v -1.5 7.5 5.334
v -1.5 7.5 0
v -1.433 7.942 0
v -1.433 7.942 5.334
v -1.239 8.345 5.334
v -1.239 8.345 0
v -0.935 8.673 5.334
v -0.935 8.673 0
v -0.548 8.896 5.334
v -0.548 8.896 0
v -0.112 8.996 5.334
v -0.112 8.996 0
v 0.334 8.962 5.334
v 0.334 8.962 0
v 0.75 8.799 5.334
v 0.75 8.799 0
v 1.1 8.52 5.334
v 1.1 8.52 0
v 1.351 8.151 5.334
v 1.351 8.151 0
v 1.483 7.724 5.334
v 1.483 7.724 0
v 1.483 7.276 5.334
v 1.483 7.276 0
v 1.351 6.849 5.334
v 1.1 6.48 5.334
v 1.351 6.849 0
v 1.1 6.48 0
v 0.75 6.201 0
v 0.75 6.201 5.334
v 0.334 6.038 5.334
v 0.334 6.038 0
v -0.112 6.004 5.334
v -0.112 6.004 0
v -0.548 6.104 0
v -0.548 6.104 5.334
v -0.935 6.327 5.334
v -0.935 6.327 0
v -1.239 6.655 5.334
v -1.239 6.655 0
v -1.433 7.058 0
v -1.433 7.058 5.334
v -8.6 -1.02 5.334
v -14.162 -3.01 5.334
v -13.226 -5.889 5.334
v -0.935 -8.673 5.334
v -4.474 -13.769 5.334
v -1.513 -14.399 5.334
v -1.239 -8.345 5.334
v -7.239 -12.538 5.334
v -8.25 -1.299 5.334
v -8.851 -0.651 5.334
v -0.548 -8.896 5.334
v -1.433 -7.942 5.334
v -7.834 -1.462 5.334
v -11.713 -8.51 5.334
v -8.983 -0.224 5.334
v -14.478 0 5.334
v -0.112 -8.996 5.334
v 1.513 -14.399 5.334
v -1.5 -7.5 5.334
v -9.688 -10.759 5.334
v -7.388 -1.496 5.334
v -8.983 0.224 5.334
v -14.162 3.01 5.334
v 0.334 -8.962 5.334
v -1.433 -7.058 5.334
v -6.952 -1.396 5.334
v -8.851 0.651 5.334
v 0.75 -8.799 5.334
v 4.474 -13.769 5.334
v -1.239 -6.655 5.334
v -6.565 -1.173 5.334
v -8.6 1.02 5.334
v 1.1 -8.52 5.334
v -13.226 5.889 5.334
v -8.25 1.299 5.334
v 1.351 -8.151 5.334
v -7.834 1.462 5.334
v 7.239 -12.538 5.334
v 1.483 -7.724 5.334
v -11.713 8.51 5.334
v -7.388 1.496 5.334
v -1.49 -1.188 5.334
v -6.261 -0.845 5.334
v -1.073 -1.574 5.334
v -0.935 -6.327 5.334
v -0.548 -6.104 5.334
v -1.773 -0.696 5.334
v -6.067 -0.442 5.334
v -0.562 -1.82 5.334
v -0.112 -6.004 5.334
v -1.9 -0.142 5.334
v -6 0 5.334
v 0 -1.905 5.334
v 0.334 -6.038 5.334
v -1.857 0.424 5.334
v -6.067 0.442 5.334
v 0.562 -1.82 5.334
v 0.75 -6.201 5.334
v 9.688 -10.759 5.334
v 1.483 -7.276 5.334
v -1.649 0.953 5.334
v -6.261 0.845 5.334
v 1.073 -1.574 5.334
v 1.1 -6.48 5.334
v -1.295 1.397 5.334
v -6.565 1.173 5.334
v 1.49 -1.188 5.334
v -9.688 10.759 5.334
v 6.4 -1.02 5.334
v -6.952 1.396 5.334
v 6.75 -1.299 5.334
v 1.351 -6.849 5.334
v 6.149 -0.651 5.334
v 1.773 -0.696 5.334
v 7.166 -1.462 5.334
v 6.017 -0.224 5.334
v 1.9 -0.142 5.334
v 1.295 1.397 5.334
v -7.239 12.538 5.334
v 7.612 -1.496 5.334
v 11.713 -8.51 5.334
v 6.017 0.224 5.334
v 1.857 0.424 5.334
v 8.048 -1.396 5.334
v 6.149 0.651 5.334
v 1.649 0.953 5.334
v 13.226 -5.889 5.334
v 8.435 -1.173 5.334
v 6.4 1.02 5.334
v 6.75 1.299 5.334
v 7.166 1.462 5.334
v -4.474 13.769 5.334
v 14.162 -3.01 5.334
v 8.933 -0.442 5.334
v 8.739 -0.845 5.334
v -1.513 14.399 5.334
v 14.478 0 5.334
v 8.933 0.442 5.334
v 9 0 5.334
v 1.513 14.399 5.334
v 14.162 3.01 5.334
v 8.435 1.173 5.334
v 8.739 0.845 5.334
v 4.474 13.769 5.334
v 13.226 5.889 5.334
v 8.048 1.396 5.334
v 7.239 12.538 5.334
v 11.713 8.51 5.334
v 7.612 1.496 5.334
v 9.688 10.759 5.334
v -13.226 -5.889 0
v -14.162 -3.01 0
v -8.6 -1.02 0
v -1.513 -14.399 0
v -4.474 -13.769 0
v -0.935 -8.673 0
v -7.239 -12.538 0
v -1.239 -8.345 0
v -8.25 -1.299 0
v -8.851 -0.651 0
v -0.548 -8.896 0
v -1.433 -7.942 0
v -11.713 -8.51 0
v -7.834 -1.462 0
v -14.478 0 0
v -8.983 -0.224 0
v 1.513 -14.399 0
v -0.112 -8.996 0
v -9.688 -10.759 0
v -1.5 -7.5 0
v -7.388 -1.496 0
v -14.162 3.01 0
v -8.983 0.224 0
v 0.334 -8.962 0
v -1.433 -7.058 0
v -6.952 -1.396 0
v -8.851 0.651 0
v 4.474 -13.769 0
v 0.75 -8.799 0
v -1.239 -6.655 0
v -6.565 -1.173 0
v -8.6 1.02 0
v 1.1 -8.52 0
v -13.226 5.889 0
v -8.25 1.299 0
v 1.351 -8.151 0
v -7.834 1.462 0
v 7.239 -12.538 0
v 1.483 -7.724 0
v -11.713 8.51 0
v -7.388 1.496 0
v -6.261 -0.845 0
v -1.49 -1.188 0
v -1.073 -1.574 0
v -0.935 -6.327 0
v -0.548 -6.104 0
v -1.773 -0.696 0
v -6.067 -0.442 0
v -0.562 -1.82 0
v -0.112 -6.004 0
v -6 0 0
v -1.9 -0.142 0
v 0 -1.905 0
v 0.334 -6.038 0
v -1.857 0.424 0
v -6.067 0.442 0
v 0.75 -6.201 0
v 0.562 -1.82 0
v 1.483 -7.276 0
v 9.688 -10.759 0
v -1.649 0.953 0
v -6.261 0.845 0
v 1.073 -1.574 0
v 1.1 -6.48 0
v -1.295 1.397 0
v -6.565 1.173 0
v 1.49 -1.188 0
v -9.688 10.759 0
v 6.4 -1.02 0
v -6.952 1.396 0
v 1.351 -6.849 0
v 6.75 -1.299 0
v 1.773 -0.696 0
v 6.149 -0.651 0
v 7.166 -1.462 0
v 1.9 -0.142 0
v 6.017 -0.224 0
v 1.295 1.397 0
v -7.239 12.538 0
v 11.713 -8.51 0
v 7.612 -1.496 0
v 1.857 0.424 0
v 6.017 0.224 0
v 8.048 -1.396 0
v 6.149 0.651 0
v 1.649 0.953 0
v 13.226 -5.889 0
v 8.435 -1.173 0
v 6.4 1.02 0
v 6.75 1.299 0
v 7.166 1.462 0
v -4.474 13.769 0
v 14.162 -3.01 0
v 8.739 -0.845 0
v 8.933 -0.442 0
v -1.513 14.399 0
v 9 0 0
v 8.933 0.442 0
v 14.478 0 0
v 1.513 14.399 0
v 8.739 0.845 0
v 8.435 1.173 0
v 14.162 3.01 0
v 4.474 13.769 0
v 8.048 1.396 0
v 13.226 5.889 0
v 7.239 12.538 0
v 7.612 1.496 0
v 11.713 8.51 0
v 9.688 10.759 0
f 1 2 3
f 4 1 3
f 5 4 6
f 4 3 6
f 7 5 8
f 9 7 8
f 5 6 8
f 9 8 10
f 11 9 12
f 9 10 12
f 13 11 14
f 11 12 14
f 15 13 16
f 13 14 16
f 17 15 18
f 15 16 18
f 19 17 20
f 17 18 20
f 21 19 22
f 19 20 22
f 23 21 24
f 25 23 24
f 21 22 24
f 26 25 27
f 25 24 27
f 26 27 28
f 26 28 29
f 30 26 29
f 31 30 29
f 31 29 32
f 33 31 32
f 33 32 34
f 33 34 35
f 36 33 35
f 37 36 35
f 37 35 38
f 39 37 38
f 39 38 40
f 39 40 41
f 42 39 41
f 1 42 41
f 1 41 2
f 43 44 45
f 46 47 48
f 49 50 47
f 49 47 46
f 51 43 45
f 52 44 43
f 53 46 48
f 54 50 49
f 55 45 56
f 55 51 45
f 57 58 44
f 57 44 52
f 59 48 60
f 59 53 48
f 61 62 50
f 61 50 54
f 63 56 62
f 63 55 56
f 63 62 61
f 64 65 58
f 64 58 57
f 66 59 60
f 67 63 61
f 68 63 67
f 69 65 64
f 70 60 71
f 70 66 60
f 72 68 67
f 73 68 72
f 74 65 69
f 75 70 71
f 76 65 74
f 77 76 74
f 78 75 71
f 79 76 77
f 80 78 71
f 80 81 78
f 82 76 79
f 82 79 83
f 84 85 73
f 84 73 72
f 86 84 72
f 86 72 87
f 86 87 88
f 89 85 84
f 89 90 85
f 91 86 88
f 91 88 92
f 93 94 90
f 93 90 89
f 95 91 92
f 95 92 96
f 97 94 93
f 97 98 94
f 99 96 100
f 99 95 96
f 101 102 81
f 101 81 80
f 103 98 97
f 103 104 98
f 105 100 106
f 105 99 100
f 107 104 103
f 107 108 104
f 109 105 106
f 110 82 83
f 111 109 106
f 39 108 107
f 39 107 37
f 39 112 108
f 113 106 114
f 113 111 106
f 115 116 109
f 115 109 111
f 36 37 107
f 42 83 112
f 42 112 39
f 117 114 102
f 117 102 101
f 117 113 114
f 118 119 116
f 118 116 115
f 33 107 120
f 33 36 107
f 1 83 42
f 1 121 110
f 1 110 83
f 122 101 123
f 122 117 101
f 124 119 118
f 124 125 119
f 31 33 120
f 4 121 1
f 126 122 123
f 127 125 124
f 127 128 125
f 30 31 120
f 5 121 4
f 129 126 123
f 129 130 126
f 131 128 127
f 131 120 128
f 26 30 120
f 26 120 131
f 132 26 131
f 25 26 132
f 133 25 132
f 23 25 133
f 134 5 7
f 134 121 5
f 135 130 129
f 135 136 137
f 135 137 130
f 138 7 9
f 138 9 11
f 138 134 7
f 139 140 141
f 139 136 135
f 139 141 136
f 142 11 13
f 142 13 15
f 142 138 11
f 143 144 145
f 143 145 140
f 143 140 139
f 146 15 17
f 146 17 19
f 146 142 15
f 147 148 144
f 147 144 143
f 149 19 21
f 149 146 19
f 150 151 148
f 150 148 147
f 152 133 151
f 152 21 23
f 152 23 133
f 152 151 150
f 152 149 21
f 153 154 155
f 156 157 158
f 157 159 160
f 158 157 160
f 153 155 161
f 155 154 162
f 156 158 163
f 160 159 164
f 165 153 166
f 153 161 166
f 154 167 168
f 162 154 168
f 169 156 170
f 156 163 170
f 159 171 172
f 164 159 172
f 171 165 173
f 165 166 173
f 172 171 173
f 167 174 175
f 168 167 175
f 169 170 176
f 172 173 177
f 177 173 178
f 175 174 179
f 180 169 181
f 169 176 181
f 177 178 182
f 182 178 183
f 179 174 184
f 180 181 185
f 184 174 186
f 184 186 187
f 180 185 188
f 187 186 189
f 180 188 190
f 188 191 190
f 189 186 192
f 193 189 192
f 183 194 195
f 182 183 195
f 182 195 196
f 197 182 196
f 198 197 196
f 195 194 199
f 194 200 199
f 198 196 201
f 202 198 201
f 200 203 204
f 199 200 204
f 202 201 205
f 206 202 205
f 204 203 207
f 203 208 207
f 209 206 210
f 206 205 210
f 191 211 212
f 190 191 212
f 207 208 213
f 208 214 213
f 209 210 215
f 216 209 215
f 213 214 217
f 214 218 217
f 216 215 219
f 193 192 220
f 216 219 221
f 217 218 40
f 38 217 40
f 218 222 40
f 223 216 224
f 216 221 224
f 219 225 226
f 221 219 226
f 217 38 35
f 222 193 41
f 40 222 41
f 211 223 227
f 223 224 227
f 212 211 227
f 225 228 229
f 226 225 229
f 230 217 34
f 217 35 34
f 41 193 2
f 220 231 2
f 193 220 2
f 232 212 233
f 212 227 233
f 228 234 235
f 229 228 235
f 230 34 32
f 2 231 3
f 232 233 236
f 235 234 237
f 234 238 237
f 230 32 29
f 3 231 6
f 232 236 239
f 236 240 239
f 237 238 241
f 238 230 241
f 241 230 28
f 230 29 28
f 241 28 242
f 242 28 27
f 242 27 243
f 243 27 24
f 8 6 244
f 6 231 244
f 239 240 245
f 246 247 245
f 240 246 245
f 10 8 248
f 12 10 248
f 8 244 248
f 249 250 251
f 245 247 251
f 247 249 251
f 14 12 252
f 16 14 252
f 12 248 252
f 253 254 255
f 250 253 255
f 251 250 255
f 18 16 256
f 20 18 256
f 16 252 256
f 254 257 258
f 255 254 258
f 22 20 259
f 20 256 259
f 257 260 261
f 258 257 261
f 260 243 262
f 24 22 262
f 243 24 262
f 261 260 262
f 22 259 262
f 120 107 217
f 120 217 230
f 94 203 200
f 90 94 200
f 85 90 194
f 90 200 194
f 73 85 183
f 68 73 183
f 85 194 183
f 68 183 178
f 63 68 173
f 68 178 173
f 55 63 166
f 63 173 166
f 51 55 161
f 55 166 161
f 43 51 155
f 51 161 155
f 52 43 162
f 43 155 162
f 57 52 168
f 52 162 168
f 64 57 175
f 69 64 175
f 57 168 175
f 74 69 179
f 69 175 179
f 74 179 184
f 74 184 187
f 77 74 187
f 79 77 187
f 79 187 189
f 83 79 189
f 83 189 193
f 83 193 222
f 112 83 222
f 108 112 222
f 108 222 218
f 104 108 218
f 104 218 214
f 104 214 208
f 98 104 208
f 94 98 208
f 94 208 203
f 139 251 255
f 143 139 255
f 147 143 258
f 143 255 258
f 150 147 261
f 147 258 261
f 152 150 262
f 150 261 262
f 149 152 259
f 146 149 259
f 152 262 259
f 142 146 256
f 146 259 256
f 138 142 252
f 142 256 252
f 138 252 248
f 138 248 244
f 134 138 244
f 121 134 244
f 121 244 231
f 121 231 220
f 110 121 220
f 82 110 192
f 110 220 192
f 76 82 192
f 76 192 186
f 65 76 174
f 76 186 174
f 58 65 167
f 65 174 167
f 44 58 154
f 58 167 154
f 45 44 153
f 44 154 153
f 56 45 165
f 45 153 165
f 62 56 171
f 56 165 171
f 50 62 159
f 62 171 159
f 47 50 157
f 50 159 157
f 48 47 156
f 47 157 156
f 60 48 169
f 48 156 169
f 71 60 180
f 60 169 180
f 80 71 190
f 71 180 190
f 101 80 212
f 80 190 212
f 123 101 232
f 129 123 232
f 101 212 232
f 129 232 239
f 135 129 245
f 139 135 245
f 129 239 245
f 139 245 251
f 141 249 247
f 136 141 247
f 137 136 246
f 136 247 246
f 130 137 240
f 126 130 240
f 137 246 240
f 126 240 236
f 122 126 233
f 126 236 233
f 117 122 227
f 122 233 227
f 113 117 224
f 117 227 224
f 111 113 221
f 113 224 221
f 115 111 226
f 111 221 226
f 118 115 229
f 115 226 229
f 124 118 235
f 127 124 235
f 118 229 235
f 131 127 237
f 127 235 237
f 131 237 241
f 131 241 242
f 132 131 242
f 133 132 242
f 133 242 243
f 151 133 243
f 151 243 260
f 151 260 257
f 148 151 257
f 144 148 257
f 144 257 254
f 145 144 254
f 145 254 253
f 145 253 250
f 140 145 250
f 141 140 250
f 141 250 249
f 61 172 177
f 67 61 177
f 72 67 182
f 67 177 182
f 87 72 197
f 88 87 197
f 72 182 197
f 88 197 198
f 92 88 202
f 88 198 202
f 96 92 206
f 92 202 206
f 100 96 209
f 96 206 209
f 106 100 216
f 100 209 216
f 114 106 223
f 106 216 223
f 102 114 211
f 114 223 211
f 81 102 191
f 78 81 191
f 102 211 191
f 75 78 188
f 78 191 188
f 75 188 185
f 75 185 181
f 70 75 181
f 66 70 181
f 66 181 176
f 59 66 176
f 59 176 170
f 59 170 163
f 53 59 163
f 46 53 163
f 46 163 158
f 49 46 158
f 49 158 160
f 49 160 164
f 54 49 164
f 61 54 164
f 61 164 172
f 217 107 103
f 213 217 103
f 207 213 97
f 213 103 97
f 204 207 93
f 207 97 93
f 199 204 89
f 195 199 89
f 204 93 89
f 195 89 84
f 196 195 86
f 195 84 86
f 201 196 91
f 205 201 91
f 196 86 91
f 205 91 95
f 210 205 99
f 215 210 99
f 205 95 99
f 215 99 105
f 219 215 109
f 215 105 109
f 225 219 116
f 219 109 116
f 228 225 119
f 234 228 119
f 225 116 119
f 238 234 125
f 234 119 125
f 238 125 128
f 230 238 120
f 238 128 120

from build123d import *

# Parameters (mm, degrees)
SKETCH1_R           = 14.478
BOSS_EXTRUDE1_DEPTH = 5.334
SKETCH2_R           = 1.905
CUT_EXTRUDE2_DEPTH  = 5.334
BOSS_EXTRUDE3_DEPTH = 5.334
SKETCH4_R           = 1.5
CUT_EXTRUDE4_DEPTH  = 22.158367706


with BuildPart() as part:
    # Sketch1 → Boss-Extrude1 (new body)
    with BuildSketch(Plane.XY):
        Circle(SKETCH1_R)
    extrude(amount=BOSS_EXTRUDE1_DEPTH)

    # Sketch2 → Cut-Extrude2 (cut)
    with BuildSketch(Plane.XY.offset(5.334)):
        Circle(SKETCH2_R)
    extrude(amount=-CUT_EXTRUDE2_DEPTH, mode=Mode.SUBTRACT)

    # Sketch3 → Boss-Extrude3 (add)
    with BuildSketch(Plane.XY.offset(5.334)):
        with BuildLine():
            Line((-1.295150956, 1.397), (1.295150956, 1.397))
            ThreePointArc((1.295150956, 1.397), (0, 1.905), (-1.295150956, 1.397))
        make_face()
    extrude(amount=-BOSS_EXTRUDE3_DEPTH)

    # Sketch4 → Cut-Extrude4 (cut, through all)
    with BuildSketch(Plane(origin=(0, 0, 0), x_dir=(-1, 0, 0), z_dir=(0, 0, -1))):
        with Locations((0, -7.5)):
            Circle(SKETCH4_R)
        with Locations(Location((7.5, 0, 0), (0, 0, 180))):
            Circle(SKETCH4_R)
        with Locations(Location((-7.5, 0, 0), (0, 0, 180))):
            Circle(SKETCH4_R)
        with Locations((0, 7.5)):
            Circle(SKETCH4_R)
    extrude(amount=-CUT_EXTRUDE4_DEPTH, mode=Mode.SUBTRACT)


solid = part.part
